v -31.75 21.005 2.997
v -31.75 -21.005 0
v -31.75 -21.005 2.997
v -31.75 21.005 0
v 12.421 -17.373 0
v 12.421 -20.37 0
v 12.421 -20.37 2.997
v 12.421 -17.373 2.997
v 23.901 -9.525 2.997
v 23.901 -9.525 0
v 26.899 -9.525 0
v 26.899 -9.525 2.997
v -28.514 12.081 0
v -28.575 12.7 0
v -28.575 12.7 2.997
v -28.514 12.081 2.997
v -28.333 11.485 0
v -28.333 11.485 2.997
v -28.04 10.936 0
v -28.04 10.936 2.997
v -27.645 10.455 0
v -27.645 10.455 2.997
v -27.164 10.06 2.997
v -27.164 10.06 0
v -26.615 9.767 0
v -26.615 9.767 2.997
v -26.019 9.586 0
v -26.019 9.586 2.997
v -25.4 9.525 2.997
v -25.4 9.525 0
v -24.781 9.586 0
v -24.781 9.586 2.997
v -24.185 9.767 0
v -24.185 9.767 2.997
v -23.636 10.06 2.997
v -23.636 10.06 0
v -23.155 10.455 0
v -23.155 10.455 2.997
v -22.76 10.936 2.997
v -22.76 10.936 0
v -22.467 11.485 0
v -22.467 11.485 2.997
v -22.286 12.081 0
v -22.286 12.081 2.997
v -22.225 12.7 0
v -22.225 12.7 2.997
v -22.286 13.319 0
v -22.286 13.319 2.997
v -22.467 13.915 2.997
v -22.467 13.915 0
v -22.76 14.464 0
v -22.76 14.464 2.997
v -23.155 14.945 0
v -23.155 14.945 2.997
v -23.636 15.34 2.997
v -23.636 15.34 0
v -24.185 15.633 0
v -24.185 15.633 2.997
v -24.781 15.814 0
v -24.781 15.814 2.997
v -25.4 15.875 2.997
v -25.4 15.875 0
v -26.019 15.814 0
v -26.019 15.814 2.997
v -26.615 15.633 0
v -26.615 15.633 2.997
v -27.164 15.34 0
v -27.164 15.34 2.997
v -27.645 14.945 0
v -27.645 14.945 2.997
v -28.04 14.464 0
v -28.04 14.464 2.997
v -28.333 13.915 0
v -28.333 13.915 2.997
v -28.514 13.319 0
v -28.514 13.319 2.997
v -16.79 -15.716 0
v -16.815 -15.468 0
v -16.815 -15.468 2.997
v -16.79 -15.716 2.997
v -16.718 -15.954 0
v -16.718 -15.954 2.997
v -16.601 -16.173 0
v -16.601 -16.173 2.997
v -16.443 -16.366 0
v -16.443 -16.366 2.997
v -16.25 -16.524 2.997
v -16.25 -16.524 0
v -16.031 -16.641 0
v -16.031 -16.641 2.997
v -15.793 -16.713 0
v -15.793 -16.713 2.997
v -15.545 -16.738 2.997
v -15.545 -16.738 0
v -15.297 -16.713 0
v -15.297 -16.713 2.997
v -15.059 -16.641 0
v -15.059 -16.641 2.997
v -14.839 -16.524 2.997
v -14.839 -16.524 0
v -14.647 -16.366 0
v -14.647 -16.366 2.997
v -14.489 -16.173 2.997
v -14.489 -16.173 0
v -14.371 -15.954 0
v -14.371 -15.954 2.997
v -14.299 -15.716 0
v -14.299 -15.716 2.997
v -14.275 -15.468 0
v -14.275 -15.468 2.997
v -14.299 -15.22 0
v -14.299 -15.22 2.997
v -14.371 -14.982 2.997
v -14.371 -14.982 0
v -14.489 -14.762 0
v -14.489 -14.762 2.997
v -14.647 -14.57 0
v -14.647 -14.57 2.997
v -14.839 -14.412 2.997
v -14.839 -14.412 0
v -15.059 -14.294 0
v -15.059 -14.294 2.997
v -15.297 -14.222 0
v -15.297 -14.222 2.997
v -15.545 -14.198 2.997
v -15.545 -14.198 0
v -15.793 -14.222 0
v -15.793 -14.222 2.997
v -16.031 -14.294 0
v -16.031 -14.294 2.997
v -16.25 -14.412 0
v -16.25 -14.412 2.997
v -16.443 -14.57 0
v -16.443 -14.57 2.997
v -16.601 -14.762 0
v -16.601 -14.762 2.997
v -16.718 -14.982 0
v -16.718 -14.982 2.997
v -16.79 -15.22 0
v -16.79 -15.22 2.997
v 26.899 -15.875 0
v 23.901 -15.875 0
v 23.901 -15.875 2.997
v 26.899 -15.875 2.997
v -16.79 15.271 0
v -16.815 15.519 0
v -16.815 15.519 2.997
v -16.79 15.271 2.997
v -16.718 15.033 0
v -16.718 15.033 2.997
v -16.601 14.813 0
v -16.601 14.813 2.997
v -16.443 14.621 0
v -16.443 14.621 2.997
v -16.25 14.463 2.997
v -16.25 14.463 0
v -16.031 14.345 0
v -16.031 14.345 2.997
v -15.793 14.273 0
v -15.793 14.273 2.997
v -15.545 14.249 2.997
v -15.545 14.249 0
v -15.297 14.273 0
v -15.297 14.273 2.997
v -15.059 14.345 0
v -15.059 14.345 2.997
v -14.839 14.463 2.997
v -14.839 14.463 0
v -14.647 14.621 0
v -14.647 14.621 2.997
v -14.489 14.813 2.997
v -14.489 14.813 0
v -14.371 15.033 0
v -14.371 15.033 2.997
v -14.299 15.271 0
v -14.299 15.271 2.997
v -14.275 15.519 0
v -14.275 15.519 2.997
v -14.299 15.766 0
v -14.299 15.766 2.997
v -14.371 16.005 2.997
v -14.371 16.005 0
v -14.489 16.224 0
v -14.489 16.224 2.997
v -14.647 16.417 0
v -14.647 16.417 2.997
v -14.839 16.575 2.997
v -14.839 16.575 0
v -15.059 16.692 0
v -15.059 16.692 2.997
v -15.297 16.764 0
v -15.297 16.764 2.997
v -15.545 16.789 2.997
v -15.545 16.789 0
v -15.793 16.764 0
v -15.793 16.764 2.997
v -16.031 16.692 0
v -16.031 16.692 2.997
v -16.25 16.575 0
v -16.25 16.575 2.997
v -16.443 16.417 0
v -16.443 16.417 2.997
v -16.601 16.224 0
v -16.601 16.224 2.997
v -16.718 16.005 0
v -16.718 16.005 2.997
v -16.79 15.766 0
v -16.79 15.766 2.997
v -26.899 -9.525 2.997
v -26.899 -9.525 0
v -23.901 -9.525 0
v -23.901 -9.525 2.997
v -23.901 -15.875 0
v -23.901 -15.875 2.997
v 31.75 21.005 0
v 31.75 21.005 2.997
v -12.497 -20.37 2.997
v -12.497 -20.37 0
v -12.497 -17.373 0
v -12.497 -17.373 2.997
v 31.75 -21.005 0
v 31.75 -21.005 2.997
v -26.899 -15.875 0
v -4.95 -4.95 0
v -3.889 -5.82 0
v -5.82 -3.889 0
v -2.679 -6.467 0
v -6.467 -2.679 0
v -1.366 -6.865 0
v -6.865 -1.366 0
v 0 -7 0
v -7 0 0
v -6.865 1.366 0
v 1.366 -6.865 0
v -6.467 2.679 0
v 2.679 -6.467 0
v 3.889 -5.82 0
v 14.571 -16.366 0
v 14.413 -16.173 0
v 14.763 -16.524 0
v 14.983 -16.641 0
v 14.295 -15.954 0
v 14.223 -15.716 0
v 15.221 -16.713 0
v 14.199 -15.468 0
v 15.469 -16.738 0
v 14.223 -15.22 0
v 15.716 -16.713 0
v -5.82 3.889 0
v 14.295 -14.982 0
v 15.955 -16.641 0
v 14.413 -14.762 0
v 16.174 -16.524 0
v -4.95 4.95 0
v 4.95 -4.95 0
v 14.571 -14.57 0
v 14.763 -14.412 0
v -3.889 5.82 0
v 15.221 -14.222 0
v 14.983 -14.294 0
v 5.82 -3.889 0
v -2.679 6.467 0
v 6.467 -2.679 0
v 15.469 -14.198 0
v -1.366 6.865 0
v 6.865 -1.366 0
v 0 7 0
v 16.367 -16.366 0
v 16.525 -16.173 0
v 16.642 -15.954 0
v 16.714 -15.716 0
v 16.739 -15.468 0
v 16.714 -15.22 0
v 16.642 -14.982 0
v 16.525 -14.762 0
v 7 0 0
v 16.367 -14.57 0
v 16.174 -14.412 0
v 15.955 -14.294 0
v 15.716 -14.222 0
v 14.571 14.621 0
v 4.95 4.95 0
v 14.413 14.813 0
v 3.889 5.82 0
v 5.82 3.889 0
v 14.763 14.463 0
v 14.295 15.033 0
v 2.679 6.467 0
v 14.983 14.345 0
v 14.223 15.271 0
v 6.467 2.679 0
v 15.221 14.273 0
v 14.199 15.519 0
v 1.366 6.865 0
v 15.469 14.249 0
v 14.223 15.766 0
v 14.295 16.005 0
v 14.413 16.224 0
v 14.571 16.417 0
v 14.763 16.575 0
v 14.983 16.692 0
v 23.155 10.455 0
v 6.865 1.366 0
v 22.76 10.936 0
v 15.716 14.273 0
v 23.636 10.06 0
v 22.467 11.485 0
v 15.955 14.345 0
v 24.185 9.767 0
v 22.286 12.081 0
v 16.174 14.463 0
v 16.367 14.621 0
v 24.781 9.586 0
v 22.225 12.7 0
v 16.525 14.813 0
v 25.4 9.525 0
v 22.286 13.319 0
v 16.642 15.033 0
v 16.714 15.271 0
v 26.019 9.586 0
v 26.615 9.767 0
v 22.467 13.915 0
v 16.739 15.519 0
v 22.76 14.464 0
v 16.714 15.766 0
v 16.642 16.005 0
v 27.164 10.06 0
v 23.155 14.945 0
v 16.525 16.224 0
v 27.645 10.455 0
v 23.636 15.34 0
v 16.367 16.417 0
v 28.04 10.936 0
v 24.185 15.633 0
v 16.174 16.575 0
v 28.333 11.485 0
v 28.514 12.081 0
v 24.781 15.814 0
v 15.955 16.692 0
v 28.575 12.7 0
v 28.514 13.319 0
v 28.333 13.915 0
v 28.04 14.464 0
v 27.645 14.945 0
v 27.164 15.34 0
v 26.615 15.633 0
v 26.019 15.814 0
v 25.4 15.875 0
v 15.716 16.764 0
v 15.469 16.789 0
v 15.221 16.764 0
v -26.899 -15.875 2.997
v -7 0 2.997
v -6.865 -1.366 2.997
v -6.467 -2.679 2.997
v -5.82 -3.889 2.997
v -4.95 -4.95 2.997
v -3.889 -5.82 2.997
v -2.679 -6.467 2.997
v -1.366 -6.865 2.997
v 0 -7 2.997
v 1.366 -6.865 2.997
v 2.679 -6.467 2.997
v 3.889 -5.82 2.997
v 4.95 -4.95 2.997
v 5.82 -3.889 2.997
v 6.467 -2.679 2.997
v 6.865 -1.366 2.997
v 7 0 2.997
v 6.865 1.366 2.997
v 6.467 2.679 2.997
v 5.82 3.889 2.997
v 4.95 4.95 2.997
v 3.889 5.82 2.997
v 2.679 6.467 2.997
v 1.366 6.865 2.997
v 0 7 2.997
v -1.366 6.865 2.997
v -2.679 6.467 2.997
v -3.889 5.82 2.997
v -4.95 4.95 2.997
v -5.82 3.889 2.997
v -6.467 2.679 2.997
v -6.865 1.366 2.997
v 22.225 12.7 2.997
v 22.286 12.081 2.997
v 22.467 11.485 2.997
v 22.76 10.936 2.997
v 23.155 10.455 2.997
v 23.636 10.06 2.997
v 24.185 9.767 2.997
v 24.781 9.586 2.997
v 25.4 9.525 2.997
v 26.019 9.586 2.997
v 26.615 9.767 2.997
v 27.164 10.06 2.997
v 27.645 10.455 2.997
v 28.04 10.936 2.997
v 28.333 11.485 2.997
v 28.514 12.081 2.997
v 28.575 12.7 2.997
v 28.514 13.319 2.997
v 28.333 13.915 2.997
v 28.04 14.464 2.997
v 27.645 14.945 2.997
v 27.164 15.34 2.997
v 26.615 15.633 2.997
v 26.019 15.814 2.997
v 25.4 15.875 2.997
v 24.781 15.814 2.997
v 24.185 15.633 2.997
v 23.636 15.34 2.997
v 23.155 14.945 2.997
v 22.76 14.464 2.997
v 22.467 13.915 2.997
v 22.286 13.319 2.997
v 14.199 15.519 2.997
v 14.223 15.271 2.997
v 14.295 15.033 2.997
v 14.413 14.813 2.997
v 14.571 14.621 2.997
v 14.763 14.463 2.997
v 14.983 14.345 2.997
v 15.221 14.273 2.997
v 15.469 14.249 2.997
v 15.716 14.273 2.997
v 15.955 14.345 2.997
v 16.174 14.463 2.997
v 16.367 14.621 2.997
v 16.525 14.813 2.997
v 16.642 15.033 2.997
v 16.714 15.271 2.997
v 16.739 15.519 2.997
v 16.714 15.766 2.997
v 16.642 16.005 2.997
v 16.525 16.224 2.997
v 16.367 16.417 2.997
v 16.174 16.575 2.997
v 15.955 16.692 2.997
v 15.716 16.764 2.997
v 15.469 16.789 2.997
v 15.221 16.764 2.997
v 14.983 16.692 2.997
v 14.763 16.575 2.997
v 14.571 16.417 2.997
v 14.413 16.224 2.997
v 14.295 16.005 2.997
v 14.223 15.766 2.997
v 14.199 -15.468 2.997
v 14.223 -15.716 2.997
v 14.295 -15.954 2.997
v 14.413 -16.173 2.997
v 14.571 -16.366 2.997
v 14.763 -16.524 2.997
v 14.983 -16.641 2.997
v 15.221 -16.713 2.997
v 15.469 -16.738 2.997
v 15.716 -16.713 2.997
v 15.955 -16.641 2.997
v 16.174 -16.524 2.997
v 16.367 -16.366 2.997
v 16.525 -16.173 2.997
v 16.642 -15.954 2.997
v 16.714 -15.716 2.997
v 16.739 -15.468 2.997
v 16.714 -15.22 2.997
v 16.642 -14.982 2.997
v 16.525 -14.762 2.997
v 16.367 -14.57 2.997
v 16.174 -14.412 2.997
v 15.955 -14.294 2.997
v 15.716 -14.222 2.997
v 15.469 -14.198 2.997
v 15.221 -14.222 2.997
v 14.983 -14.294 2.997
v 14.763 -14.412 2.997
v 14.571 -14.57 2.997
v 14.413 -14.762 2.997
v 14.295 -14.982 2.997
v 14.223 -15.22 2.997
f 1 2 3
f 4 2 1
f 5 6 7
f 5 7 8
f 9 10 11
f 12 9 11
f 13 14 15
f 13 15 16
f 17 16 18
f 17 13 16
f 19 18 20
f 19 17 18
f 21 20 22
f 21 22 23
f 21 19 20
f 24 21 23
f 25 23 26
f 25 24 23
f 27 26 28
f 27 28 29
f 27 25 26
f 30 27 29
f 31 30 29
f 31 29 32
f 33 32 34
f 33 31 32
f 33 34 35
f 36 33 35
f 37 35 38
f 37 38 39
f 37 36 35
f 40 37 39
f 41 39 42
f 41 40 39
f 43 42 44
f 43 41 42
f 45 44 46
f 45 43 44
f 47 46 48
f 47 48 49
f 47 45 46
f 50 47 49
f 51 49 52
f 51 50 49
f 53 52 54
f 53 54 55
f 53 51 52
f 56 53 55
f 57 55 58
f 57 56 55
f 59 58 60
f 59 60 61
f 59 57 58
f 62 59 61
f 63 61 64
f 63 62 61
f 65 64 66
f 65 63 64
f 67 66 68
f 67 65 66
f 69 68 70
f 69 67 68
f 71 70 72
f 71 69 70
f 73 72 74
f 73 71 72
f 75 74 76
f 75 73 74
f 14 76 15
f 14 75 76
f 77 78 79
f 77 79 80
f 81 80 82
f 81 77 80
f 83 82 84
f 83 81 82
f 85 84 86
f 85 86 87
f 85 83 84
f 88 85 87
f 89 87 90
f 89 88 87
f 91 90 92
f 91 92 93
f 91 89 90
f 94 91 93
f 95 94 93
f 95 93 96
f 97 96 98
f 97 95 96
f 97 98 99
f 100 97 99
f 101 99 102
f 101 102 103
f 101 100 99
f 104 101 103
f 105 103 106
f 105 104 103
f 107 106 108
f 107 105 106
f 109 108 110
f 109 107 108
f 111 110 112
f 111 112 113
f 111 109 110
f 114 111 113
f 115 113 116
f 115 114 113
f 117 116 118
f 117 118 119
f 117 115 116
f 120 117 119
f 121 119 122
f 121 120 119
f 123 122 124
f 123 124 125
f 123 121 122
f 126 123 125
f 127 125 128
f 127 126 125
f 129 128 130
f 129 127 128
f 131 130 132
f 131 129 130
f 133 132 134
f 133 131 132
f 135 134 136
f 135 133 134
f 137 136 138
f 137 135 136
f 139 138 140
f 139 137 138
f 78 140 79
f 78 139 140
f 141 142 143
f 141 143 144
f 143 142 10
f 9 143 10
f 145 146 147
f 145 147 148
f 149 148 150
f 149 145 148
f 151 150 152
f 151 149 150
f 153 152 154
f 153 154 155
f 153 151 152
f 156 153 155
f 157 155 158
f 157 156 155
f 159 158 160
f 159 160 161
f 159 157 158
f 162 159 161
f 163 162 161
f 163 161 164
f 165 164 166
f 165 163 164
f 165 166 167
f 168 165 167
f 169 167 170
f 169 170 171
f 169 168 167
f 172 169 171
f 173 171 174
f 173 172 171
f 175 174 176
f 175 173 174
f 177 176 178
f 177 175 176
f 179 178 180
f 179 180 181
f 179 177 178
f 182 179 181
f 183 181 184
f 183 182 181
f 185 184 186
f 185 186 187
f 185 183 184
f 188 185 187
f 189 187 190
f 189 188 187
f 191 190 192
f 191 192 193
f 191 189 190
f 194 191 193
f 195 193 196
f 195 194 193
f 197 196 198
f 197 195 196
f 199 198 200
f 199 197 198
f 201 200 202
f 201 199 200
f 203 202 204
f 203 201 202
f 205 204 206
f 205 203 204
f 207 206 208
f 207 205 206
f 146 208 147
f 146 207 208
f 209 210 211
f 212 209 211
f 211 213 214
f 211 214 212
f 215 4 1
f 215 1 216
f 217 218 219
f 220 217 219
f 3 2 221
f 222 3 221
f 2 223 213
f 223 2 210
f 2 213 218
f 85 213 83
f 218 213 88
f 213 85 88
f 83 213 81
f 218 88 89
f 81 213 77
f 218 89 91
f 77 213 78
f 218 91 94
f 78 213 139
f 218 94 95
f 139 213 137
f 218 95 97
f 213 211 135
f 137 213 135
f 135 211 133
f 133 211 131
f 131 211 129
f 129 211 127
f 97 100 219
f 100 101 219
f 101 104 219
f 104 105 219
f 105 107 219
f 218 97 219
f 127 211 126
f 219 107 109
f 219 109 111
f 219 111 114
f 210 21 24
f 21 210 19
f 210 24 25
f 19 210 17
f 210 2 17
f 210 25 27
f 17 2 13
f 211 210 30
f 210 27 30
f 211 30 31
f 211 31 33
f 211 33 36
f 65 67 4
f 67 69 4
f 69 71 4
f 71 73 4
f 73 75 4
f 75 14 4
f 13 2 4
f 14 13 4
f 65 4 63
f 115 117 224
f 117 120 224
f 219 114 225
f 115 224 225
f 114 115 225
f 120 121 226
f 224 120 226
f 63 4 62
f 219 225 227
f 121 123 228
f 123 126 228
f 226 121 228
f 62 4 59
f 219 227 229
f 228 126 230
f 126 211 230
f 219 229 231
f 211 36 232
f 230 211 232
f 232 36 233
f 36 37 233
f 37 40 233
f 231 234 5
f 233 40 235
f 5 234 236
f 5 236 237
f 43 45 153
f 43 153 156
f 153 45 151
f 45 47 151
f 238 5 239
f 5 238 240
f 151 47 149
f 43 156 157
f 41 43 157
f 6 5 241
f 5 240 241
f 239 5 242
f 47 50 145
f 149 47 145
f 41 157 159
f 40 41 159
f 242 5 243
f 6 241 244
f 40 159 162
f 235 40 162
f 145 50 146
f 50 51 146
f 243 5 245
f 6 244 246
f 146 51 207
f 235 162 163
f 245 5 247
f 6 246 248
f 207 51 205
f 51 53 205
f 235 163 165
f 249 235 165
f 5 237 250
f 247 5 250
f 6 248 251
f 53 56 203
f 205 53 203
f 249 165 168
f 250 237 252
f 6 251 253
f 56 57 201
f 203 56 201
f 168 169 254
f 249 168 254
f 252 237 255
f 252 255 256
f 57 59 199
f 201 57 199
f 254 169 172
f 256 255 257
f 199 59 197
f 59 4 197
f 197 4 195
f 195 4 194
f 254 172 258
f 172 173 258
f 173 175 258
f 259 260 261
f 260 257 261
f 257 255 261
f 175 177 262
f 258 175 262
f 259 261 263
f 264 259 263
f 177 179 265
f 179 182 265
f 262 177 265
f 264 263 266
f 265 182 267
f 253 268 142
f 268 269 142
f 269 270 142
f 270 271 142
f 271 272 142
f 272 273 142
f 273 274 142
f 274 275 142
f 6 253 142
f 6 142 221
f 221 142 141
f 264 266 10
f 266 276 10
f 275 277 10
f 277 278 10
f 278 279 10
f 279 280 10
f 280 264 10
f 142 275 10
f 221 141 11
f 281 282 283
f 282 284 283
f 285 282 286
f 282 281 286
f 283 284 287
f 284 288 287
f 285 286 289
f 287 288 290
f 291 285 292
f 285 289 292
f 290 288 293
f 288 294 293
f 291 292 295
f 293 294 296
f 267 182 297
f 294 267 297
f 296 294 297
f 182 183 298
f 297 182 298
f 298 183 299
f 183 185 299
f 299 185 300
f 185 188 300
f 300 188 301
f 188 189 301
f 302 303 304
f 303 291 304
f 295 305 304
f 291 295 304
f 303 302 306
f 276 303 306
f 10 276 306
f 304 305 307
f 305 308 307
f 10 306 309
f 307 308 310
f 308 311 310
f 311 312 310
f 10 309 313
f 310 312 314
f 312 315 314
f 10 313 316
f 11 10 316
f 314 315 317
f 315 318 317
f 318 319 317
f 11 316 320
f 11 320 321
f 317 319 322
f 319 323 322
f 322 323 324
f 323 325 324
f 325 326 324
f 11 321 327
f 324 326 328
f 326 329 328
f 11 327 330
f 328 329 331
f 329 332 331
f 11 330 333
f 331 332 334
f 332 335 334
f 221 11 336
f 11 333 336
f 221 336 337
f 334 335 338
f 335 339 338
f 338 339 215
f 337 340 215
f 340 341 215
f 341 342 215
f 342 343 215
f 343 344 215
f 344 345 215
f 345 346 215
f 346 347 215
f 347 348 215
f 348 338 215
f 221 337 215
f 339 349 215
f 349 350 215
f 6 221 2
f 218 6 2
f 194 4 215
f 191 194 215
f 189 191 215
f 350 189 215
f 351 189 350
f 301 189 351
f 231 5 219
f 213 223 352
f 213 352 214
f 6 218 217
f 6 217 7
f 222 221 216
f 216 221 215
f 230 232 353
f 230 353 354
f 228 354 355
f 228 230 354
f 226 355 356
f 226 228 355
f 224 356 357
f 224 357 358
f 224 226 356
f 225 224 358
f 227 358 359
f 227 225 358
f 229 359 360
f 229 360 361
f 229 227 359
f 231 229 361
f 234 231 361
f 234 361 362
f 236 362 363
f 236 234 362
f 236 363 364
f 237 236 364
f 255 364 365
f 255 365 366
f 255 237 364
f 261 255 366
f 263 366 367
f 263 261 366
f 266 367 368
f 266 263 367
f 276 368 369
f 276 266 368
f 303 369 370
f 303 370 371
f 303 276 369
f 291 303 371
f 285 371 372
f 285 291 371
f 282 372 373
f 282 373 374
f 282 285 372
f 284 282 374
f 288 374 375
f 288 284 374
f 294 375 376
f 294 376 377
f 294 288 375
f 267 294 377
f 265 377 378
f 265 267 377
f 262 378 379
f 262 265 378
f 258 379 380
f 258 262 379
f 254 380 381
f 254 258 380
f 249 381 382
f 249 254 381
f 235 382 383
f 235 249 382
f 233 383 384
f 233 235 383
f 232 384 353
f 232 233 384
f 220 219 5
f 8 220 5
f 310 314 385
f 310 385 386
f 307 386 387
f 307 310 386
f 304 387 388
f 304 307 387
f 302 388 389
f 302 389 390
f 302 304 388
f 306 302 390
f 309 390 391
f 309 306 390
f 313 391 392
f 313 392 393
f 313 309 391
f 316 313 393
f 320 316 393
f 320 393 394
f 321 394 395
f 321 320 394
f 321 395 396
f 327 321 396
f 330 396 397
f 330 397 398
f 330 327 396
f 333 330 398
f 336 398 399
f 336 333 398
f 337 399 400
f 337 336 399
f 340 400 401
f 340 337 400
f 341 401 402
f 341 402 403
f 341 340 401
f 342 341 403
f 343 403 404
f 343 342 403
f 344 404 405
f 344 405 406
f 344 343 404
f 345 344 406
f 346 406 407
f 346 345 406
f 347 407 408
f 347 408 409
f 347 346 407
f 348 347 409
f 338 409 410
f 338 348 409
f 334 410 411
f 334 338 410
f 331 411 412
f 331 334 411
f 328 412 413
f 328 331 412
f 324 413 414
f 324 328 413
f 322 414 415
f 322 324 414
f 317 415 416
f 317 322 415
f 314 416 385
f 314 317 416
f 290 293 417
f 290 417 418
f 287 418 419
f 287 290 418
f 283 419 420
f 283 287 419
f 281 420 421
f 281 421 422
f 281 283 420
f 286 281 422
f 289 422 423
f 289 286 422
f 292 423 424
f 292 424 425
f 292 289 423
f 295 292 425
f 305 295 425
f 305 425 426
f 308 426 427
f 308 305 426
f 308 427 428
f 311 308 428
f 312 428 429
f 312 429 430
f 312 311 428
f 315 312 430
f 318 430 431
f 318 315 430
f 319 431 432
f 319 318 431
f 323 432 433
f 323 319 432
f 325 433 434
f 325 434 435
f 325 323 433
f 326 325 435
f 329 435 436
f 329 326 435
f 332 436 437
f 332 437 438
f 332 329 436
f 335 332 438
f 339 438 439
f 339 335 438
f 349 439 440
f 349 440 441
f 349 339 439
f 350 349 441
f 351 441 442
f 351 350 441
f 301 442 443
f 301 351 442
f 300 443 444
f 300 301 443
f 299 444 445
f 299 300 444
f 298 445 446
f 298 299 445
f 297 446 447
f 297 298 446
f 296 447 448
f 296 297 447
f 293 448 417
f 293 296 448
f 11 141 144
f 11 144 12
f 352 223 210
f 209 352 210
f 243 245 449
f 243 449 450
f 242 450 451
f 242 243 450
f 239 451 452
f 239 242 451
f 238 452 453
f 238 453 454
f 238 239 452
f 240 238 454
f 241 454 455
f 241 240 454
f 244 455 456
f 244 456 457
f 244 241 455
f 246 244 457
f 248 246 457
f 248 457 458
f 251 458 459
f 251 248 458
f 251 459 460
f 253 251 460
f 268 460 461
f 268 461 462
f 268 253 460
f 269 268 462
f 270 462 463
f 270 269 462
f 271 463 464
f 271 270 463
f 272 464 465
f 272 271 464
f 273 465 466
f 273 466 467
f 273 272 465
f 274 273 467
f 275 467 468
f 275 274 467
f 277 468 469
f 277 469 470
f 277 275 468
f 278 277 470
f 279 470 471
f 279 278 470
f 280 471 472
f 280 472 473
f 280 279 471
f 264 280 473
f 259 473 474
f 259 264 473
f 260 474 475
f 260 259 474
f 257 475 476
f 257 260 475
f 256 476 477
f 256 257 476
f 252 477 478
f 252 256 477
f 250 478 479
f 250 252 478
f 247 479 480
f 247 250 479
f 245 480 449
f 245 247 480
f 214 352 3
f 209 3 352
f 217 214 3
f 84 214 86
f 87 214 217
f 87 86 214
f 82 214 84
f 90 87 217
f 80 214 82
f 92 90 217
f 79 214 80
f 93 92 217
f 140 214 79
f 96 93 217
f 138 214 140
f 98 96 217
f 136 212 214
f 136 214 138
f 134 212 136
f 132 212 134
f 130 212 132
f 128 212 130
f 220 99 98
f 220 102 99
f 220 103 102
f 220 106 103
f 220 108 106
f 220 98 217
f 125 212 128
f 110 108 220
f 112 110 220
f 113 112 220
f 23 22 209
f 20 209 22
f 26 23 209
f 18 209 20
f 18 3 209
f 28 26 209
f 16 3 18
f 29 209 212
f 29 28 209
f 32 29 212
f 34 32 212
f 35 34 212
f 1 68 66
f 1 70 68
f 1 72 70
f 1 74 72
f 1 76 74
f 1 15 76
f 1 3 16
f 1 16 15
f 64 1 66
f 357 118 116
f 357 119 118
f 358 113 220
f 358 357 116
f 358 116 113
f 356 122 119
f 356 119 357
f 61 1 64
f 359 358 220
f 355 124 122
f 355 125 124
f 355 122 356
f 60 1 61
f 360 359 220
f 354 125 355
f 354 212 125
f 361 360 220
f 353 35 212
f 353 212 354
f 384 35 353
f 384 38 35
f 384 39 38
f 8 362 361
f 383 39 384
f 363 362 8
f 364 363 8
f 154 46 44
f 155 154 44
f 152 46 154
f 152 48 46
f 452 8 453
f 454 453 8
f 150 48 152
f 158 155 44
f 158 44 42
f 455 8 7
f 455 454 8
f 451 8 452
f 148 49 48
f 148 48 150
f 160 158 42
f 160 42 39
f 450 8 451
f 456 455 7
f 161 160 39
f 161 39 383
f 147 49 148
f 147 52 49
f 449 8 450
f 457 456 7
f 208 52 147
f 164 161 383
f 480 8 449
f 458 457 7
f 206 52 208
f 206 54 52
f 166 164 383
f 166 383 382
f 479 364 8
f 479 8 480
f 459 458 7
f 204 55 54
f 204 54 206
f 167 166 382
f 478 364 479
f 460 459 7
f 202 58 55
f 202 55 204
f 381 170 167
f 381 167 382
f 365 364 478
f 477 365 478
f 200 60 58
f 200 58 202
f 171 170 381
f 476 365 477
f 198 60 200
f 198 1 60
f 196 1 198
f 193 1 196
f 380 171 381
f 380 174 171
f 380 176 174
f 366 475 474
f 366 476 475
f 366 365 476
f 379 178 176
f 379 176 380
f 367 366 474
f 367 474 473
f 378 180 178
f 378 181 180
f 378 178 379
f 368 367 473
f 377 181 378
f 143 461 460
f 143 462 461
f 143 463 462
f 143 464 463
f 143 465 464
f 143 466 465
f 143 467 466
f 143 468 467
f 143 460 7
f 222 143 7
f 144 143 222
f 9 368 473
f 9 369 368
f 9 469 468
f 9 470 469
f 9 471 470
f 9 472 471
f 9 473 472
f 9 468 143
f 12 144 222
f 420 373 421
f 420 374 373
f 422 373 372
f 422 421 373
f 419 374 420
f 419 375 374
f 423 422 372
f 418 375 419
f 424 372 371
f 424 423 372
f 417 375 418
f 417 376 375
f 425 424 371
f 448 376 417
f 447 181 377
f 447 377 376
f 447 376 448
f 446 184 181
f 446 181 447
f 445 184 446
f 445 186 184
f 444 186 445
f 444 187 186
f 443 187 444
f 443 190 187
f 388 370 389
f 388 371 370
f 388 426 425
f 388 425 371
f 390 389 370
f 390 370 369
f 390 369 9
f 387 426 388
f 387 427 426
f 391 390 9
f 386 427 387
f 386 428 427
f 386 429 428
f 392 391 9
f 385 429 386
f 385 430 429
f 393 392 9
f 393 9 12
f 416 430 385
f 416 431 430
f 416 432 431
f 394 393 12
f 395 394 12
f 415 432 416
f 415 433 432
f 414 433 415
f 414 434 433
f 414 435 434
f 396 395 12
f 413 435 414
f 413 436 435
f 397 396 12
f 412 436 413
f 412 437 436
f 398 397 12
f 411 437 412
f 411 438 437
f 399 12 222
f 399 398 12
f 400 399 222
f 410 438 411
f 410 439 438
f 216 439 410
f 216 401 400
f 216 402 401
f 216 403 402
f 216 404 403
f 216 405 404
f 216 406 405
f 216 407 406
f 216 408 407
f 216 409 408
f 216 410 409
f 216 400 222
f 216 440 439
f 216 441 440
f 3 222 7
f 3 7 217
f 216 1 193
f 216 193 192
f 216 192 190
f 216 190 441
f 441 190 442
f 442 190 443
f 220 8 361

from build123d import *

# Parameters (mm, degrees)
SKETCH1_W           = 63.5
SKETCH1_H           = 42.01
SKETCH1_R           = 1.27
SKETCH1_R_2         = 3.175
SKETCH1_R_3         = 7
SKETCH1_W_2         = 24.9174
SKETCH1_H_2         = 2.9972
SKETCH1_W_3         = 2.9972
SKETCH1_H_3         = 6.35
BOSS_EXTRUDE1_DEPTH = 2.9972


with BuildPart() as part:
    # Sketch1 → Boss-Extrude1 (new body)
    with BuildSketch(Plane.XY):
        Rectangle(SKETCH1_W, SKETCH1_H)
        with Locations(Location((-15.5448, -15.4678, 0), (0, 0, 180))):
            Circle(SKETCH1_R, mode=Mode.SUBTRACT)
        with Locations(Location((15.4686, -15.4678, 0), (0, 0, 180))):
            Circle(SKETCH1_R, mode=Mode.SUBTRACT)
        with Locations(Location((15.4686, 15.5186, 0), (0, 0, 180))):
            Circle(SKETCH1_R, mode=Mode.SUBTRACT)
        with Locations(Location((-15.5448, 15.5186, 0), (0, 0, 180))):
            Circle(SKETCH1_R, mode=Mode.SUBTRACT)
        with Locations(Location((25.4, 12.7, 0), (0, 0, 180))):
            Circle(SKETCH1_R_2, mode=Mode.SUBTRACT)
        with Locations(Location((0, 0, 0), (0, 0, 180))):
            Circle(SKETCH1_R_3, mode=Mode.SUBTRACT)
        with Locations(Location((-25.4, 12.7, 0), (0, 0, 180))):
            Circle(SKETCH1_R_2, mode=Mode.SUBTRACT)
        with Locations((-0.0381, -18.8714)):
            Rectangle(SKETCH1_W_2, SKETCH1_H_2, mode=Mode.SUBTRACT)
        with Locations((-25.4, -12.7)):
            Rectangle(SKETCH1_W_3, SKETCH1_H_3, mode=Mode.SUBTRACT)
        with Locations((25.4, -12.7)):
            Rectangle(SKETCH1_W_3, SKETCH1_H_3, mode=Mode.SUBTRACT)
    extrude(amount=BOSS_EXTRUDE1_DEPTH)


solid = part.part
